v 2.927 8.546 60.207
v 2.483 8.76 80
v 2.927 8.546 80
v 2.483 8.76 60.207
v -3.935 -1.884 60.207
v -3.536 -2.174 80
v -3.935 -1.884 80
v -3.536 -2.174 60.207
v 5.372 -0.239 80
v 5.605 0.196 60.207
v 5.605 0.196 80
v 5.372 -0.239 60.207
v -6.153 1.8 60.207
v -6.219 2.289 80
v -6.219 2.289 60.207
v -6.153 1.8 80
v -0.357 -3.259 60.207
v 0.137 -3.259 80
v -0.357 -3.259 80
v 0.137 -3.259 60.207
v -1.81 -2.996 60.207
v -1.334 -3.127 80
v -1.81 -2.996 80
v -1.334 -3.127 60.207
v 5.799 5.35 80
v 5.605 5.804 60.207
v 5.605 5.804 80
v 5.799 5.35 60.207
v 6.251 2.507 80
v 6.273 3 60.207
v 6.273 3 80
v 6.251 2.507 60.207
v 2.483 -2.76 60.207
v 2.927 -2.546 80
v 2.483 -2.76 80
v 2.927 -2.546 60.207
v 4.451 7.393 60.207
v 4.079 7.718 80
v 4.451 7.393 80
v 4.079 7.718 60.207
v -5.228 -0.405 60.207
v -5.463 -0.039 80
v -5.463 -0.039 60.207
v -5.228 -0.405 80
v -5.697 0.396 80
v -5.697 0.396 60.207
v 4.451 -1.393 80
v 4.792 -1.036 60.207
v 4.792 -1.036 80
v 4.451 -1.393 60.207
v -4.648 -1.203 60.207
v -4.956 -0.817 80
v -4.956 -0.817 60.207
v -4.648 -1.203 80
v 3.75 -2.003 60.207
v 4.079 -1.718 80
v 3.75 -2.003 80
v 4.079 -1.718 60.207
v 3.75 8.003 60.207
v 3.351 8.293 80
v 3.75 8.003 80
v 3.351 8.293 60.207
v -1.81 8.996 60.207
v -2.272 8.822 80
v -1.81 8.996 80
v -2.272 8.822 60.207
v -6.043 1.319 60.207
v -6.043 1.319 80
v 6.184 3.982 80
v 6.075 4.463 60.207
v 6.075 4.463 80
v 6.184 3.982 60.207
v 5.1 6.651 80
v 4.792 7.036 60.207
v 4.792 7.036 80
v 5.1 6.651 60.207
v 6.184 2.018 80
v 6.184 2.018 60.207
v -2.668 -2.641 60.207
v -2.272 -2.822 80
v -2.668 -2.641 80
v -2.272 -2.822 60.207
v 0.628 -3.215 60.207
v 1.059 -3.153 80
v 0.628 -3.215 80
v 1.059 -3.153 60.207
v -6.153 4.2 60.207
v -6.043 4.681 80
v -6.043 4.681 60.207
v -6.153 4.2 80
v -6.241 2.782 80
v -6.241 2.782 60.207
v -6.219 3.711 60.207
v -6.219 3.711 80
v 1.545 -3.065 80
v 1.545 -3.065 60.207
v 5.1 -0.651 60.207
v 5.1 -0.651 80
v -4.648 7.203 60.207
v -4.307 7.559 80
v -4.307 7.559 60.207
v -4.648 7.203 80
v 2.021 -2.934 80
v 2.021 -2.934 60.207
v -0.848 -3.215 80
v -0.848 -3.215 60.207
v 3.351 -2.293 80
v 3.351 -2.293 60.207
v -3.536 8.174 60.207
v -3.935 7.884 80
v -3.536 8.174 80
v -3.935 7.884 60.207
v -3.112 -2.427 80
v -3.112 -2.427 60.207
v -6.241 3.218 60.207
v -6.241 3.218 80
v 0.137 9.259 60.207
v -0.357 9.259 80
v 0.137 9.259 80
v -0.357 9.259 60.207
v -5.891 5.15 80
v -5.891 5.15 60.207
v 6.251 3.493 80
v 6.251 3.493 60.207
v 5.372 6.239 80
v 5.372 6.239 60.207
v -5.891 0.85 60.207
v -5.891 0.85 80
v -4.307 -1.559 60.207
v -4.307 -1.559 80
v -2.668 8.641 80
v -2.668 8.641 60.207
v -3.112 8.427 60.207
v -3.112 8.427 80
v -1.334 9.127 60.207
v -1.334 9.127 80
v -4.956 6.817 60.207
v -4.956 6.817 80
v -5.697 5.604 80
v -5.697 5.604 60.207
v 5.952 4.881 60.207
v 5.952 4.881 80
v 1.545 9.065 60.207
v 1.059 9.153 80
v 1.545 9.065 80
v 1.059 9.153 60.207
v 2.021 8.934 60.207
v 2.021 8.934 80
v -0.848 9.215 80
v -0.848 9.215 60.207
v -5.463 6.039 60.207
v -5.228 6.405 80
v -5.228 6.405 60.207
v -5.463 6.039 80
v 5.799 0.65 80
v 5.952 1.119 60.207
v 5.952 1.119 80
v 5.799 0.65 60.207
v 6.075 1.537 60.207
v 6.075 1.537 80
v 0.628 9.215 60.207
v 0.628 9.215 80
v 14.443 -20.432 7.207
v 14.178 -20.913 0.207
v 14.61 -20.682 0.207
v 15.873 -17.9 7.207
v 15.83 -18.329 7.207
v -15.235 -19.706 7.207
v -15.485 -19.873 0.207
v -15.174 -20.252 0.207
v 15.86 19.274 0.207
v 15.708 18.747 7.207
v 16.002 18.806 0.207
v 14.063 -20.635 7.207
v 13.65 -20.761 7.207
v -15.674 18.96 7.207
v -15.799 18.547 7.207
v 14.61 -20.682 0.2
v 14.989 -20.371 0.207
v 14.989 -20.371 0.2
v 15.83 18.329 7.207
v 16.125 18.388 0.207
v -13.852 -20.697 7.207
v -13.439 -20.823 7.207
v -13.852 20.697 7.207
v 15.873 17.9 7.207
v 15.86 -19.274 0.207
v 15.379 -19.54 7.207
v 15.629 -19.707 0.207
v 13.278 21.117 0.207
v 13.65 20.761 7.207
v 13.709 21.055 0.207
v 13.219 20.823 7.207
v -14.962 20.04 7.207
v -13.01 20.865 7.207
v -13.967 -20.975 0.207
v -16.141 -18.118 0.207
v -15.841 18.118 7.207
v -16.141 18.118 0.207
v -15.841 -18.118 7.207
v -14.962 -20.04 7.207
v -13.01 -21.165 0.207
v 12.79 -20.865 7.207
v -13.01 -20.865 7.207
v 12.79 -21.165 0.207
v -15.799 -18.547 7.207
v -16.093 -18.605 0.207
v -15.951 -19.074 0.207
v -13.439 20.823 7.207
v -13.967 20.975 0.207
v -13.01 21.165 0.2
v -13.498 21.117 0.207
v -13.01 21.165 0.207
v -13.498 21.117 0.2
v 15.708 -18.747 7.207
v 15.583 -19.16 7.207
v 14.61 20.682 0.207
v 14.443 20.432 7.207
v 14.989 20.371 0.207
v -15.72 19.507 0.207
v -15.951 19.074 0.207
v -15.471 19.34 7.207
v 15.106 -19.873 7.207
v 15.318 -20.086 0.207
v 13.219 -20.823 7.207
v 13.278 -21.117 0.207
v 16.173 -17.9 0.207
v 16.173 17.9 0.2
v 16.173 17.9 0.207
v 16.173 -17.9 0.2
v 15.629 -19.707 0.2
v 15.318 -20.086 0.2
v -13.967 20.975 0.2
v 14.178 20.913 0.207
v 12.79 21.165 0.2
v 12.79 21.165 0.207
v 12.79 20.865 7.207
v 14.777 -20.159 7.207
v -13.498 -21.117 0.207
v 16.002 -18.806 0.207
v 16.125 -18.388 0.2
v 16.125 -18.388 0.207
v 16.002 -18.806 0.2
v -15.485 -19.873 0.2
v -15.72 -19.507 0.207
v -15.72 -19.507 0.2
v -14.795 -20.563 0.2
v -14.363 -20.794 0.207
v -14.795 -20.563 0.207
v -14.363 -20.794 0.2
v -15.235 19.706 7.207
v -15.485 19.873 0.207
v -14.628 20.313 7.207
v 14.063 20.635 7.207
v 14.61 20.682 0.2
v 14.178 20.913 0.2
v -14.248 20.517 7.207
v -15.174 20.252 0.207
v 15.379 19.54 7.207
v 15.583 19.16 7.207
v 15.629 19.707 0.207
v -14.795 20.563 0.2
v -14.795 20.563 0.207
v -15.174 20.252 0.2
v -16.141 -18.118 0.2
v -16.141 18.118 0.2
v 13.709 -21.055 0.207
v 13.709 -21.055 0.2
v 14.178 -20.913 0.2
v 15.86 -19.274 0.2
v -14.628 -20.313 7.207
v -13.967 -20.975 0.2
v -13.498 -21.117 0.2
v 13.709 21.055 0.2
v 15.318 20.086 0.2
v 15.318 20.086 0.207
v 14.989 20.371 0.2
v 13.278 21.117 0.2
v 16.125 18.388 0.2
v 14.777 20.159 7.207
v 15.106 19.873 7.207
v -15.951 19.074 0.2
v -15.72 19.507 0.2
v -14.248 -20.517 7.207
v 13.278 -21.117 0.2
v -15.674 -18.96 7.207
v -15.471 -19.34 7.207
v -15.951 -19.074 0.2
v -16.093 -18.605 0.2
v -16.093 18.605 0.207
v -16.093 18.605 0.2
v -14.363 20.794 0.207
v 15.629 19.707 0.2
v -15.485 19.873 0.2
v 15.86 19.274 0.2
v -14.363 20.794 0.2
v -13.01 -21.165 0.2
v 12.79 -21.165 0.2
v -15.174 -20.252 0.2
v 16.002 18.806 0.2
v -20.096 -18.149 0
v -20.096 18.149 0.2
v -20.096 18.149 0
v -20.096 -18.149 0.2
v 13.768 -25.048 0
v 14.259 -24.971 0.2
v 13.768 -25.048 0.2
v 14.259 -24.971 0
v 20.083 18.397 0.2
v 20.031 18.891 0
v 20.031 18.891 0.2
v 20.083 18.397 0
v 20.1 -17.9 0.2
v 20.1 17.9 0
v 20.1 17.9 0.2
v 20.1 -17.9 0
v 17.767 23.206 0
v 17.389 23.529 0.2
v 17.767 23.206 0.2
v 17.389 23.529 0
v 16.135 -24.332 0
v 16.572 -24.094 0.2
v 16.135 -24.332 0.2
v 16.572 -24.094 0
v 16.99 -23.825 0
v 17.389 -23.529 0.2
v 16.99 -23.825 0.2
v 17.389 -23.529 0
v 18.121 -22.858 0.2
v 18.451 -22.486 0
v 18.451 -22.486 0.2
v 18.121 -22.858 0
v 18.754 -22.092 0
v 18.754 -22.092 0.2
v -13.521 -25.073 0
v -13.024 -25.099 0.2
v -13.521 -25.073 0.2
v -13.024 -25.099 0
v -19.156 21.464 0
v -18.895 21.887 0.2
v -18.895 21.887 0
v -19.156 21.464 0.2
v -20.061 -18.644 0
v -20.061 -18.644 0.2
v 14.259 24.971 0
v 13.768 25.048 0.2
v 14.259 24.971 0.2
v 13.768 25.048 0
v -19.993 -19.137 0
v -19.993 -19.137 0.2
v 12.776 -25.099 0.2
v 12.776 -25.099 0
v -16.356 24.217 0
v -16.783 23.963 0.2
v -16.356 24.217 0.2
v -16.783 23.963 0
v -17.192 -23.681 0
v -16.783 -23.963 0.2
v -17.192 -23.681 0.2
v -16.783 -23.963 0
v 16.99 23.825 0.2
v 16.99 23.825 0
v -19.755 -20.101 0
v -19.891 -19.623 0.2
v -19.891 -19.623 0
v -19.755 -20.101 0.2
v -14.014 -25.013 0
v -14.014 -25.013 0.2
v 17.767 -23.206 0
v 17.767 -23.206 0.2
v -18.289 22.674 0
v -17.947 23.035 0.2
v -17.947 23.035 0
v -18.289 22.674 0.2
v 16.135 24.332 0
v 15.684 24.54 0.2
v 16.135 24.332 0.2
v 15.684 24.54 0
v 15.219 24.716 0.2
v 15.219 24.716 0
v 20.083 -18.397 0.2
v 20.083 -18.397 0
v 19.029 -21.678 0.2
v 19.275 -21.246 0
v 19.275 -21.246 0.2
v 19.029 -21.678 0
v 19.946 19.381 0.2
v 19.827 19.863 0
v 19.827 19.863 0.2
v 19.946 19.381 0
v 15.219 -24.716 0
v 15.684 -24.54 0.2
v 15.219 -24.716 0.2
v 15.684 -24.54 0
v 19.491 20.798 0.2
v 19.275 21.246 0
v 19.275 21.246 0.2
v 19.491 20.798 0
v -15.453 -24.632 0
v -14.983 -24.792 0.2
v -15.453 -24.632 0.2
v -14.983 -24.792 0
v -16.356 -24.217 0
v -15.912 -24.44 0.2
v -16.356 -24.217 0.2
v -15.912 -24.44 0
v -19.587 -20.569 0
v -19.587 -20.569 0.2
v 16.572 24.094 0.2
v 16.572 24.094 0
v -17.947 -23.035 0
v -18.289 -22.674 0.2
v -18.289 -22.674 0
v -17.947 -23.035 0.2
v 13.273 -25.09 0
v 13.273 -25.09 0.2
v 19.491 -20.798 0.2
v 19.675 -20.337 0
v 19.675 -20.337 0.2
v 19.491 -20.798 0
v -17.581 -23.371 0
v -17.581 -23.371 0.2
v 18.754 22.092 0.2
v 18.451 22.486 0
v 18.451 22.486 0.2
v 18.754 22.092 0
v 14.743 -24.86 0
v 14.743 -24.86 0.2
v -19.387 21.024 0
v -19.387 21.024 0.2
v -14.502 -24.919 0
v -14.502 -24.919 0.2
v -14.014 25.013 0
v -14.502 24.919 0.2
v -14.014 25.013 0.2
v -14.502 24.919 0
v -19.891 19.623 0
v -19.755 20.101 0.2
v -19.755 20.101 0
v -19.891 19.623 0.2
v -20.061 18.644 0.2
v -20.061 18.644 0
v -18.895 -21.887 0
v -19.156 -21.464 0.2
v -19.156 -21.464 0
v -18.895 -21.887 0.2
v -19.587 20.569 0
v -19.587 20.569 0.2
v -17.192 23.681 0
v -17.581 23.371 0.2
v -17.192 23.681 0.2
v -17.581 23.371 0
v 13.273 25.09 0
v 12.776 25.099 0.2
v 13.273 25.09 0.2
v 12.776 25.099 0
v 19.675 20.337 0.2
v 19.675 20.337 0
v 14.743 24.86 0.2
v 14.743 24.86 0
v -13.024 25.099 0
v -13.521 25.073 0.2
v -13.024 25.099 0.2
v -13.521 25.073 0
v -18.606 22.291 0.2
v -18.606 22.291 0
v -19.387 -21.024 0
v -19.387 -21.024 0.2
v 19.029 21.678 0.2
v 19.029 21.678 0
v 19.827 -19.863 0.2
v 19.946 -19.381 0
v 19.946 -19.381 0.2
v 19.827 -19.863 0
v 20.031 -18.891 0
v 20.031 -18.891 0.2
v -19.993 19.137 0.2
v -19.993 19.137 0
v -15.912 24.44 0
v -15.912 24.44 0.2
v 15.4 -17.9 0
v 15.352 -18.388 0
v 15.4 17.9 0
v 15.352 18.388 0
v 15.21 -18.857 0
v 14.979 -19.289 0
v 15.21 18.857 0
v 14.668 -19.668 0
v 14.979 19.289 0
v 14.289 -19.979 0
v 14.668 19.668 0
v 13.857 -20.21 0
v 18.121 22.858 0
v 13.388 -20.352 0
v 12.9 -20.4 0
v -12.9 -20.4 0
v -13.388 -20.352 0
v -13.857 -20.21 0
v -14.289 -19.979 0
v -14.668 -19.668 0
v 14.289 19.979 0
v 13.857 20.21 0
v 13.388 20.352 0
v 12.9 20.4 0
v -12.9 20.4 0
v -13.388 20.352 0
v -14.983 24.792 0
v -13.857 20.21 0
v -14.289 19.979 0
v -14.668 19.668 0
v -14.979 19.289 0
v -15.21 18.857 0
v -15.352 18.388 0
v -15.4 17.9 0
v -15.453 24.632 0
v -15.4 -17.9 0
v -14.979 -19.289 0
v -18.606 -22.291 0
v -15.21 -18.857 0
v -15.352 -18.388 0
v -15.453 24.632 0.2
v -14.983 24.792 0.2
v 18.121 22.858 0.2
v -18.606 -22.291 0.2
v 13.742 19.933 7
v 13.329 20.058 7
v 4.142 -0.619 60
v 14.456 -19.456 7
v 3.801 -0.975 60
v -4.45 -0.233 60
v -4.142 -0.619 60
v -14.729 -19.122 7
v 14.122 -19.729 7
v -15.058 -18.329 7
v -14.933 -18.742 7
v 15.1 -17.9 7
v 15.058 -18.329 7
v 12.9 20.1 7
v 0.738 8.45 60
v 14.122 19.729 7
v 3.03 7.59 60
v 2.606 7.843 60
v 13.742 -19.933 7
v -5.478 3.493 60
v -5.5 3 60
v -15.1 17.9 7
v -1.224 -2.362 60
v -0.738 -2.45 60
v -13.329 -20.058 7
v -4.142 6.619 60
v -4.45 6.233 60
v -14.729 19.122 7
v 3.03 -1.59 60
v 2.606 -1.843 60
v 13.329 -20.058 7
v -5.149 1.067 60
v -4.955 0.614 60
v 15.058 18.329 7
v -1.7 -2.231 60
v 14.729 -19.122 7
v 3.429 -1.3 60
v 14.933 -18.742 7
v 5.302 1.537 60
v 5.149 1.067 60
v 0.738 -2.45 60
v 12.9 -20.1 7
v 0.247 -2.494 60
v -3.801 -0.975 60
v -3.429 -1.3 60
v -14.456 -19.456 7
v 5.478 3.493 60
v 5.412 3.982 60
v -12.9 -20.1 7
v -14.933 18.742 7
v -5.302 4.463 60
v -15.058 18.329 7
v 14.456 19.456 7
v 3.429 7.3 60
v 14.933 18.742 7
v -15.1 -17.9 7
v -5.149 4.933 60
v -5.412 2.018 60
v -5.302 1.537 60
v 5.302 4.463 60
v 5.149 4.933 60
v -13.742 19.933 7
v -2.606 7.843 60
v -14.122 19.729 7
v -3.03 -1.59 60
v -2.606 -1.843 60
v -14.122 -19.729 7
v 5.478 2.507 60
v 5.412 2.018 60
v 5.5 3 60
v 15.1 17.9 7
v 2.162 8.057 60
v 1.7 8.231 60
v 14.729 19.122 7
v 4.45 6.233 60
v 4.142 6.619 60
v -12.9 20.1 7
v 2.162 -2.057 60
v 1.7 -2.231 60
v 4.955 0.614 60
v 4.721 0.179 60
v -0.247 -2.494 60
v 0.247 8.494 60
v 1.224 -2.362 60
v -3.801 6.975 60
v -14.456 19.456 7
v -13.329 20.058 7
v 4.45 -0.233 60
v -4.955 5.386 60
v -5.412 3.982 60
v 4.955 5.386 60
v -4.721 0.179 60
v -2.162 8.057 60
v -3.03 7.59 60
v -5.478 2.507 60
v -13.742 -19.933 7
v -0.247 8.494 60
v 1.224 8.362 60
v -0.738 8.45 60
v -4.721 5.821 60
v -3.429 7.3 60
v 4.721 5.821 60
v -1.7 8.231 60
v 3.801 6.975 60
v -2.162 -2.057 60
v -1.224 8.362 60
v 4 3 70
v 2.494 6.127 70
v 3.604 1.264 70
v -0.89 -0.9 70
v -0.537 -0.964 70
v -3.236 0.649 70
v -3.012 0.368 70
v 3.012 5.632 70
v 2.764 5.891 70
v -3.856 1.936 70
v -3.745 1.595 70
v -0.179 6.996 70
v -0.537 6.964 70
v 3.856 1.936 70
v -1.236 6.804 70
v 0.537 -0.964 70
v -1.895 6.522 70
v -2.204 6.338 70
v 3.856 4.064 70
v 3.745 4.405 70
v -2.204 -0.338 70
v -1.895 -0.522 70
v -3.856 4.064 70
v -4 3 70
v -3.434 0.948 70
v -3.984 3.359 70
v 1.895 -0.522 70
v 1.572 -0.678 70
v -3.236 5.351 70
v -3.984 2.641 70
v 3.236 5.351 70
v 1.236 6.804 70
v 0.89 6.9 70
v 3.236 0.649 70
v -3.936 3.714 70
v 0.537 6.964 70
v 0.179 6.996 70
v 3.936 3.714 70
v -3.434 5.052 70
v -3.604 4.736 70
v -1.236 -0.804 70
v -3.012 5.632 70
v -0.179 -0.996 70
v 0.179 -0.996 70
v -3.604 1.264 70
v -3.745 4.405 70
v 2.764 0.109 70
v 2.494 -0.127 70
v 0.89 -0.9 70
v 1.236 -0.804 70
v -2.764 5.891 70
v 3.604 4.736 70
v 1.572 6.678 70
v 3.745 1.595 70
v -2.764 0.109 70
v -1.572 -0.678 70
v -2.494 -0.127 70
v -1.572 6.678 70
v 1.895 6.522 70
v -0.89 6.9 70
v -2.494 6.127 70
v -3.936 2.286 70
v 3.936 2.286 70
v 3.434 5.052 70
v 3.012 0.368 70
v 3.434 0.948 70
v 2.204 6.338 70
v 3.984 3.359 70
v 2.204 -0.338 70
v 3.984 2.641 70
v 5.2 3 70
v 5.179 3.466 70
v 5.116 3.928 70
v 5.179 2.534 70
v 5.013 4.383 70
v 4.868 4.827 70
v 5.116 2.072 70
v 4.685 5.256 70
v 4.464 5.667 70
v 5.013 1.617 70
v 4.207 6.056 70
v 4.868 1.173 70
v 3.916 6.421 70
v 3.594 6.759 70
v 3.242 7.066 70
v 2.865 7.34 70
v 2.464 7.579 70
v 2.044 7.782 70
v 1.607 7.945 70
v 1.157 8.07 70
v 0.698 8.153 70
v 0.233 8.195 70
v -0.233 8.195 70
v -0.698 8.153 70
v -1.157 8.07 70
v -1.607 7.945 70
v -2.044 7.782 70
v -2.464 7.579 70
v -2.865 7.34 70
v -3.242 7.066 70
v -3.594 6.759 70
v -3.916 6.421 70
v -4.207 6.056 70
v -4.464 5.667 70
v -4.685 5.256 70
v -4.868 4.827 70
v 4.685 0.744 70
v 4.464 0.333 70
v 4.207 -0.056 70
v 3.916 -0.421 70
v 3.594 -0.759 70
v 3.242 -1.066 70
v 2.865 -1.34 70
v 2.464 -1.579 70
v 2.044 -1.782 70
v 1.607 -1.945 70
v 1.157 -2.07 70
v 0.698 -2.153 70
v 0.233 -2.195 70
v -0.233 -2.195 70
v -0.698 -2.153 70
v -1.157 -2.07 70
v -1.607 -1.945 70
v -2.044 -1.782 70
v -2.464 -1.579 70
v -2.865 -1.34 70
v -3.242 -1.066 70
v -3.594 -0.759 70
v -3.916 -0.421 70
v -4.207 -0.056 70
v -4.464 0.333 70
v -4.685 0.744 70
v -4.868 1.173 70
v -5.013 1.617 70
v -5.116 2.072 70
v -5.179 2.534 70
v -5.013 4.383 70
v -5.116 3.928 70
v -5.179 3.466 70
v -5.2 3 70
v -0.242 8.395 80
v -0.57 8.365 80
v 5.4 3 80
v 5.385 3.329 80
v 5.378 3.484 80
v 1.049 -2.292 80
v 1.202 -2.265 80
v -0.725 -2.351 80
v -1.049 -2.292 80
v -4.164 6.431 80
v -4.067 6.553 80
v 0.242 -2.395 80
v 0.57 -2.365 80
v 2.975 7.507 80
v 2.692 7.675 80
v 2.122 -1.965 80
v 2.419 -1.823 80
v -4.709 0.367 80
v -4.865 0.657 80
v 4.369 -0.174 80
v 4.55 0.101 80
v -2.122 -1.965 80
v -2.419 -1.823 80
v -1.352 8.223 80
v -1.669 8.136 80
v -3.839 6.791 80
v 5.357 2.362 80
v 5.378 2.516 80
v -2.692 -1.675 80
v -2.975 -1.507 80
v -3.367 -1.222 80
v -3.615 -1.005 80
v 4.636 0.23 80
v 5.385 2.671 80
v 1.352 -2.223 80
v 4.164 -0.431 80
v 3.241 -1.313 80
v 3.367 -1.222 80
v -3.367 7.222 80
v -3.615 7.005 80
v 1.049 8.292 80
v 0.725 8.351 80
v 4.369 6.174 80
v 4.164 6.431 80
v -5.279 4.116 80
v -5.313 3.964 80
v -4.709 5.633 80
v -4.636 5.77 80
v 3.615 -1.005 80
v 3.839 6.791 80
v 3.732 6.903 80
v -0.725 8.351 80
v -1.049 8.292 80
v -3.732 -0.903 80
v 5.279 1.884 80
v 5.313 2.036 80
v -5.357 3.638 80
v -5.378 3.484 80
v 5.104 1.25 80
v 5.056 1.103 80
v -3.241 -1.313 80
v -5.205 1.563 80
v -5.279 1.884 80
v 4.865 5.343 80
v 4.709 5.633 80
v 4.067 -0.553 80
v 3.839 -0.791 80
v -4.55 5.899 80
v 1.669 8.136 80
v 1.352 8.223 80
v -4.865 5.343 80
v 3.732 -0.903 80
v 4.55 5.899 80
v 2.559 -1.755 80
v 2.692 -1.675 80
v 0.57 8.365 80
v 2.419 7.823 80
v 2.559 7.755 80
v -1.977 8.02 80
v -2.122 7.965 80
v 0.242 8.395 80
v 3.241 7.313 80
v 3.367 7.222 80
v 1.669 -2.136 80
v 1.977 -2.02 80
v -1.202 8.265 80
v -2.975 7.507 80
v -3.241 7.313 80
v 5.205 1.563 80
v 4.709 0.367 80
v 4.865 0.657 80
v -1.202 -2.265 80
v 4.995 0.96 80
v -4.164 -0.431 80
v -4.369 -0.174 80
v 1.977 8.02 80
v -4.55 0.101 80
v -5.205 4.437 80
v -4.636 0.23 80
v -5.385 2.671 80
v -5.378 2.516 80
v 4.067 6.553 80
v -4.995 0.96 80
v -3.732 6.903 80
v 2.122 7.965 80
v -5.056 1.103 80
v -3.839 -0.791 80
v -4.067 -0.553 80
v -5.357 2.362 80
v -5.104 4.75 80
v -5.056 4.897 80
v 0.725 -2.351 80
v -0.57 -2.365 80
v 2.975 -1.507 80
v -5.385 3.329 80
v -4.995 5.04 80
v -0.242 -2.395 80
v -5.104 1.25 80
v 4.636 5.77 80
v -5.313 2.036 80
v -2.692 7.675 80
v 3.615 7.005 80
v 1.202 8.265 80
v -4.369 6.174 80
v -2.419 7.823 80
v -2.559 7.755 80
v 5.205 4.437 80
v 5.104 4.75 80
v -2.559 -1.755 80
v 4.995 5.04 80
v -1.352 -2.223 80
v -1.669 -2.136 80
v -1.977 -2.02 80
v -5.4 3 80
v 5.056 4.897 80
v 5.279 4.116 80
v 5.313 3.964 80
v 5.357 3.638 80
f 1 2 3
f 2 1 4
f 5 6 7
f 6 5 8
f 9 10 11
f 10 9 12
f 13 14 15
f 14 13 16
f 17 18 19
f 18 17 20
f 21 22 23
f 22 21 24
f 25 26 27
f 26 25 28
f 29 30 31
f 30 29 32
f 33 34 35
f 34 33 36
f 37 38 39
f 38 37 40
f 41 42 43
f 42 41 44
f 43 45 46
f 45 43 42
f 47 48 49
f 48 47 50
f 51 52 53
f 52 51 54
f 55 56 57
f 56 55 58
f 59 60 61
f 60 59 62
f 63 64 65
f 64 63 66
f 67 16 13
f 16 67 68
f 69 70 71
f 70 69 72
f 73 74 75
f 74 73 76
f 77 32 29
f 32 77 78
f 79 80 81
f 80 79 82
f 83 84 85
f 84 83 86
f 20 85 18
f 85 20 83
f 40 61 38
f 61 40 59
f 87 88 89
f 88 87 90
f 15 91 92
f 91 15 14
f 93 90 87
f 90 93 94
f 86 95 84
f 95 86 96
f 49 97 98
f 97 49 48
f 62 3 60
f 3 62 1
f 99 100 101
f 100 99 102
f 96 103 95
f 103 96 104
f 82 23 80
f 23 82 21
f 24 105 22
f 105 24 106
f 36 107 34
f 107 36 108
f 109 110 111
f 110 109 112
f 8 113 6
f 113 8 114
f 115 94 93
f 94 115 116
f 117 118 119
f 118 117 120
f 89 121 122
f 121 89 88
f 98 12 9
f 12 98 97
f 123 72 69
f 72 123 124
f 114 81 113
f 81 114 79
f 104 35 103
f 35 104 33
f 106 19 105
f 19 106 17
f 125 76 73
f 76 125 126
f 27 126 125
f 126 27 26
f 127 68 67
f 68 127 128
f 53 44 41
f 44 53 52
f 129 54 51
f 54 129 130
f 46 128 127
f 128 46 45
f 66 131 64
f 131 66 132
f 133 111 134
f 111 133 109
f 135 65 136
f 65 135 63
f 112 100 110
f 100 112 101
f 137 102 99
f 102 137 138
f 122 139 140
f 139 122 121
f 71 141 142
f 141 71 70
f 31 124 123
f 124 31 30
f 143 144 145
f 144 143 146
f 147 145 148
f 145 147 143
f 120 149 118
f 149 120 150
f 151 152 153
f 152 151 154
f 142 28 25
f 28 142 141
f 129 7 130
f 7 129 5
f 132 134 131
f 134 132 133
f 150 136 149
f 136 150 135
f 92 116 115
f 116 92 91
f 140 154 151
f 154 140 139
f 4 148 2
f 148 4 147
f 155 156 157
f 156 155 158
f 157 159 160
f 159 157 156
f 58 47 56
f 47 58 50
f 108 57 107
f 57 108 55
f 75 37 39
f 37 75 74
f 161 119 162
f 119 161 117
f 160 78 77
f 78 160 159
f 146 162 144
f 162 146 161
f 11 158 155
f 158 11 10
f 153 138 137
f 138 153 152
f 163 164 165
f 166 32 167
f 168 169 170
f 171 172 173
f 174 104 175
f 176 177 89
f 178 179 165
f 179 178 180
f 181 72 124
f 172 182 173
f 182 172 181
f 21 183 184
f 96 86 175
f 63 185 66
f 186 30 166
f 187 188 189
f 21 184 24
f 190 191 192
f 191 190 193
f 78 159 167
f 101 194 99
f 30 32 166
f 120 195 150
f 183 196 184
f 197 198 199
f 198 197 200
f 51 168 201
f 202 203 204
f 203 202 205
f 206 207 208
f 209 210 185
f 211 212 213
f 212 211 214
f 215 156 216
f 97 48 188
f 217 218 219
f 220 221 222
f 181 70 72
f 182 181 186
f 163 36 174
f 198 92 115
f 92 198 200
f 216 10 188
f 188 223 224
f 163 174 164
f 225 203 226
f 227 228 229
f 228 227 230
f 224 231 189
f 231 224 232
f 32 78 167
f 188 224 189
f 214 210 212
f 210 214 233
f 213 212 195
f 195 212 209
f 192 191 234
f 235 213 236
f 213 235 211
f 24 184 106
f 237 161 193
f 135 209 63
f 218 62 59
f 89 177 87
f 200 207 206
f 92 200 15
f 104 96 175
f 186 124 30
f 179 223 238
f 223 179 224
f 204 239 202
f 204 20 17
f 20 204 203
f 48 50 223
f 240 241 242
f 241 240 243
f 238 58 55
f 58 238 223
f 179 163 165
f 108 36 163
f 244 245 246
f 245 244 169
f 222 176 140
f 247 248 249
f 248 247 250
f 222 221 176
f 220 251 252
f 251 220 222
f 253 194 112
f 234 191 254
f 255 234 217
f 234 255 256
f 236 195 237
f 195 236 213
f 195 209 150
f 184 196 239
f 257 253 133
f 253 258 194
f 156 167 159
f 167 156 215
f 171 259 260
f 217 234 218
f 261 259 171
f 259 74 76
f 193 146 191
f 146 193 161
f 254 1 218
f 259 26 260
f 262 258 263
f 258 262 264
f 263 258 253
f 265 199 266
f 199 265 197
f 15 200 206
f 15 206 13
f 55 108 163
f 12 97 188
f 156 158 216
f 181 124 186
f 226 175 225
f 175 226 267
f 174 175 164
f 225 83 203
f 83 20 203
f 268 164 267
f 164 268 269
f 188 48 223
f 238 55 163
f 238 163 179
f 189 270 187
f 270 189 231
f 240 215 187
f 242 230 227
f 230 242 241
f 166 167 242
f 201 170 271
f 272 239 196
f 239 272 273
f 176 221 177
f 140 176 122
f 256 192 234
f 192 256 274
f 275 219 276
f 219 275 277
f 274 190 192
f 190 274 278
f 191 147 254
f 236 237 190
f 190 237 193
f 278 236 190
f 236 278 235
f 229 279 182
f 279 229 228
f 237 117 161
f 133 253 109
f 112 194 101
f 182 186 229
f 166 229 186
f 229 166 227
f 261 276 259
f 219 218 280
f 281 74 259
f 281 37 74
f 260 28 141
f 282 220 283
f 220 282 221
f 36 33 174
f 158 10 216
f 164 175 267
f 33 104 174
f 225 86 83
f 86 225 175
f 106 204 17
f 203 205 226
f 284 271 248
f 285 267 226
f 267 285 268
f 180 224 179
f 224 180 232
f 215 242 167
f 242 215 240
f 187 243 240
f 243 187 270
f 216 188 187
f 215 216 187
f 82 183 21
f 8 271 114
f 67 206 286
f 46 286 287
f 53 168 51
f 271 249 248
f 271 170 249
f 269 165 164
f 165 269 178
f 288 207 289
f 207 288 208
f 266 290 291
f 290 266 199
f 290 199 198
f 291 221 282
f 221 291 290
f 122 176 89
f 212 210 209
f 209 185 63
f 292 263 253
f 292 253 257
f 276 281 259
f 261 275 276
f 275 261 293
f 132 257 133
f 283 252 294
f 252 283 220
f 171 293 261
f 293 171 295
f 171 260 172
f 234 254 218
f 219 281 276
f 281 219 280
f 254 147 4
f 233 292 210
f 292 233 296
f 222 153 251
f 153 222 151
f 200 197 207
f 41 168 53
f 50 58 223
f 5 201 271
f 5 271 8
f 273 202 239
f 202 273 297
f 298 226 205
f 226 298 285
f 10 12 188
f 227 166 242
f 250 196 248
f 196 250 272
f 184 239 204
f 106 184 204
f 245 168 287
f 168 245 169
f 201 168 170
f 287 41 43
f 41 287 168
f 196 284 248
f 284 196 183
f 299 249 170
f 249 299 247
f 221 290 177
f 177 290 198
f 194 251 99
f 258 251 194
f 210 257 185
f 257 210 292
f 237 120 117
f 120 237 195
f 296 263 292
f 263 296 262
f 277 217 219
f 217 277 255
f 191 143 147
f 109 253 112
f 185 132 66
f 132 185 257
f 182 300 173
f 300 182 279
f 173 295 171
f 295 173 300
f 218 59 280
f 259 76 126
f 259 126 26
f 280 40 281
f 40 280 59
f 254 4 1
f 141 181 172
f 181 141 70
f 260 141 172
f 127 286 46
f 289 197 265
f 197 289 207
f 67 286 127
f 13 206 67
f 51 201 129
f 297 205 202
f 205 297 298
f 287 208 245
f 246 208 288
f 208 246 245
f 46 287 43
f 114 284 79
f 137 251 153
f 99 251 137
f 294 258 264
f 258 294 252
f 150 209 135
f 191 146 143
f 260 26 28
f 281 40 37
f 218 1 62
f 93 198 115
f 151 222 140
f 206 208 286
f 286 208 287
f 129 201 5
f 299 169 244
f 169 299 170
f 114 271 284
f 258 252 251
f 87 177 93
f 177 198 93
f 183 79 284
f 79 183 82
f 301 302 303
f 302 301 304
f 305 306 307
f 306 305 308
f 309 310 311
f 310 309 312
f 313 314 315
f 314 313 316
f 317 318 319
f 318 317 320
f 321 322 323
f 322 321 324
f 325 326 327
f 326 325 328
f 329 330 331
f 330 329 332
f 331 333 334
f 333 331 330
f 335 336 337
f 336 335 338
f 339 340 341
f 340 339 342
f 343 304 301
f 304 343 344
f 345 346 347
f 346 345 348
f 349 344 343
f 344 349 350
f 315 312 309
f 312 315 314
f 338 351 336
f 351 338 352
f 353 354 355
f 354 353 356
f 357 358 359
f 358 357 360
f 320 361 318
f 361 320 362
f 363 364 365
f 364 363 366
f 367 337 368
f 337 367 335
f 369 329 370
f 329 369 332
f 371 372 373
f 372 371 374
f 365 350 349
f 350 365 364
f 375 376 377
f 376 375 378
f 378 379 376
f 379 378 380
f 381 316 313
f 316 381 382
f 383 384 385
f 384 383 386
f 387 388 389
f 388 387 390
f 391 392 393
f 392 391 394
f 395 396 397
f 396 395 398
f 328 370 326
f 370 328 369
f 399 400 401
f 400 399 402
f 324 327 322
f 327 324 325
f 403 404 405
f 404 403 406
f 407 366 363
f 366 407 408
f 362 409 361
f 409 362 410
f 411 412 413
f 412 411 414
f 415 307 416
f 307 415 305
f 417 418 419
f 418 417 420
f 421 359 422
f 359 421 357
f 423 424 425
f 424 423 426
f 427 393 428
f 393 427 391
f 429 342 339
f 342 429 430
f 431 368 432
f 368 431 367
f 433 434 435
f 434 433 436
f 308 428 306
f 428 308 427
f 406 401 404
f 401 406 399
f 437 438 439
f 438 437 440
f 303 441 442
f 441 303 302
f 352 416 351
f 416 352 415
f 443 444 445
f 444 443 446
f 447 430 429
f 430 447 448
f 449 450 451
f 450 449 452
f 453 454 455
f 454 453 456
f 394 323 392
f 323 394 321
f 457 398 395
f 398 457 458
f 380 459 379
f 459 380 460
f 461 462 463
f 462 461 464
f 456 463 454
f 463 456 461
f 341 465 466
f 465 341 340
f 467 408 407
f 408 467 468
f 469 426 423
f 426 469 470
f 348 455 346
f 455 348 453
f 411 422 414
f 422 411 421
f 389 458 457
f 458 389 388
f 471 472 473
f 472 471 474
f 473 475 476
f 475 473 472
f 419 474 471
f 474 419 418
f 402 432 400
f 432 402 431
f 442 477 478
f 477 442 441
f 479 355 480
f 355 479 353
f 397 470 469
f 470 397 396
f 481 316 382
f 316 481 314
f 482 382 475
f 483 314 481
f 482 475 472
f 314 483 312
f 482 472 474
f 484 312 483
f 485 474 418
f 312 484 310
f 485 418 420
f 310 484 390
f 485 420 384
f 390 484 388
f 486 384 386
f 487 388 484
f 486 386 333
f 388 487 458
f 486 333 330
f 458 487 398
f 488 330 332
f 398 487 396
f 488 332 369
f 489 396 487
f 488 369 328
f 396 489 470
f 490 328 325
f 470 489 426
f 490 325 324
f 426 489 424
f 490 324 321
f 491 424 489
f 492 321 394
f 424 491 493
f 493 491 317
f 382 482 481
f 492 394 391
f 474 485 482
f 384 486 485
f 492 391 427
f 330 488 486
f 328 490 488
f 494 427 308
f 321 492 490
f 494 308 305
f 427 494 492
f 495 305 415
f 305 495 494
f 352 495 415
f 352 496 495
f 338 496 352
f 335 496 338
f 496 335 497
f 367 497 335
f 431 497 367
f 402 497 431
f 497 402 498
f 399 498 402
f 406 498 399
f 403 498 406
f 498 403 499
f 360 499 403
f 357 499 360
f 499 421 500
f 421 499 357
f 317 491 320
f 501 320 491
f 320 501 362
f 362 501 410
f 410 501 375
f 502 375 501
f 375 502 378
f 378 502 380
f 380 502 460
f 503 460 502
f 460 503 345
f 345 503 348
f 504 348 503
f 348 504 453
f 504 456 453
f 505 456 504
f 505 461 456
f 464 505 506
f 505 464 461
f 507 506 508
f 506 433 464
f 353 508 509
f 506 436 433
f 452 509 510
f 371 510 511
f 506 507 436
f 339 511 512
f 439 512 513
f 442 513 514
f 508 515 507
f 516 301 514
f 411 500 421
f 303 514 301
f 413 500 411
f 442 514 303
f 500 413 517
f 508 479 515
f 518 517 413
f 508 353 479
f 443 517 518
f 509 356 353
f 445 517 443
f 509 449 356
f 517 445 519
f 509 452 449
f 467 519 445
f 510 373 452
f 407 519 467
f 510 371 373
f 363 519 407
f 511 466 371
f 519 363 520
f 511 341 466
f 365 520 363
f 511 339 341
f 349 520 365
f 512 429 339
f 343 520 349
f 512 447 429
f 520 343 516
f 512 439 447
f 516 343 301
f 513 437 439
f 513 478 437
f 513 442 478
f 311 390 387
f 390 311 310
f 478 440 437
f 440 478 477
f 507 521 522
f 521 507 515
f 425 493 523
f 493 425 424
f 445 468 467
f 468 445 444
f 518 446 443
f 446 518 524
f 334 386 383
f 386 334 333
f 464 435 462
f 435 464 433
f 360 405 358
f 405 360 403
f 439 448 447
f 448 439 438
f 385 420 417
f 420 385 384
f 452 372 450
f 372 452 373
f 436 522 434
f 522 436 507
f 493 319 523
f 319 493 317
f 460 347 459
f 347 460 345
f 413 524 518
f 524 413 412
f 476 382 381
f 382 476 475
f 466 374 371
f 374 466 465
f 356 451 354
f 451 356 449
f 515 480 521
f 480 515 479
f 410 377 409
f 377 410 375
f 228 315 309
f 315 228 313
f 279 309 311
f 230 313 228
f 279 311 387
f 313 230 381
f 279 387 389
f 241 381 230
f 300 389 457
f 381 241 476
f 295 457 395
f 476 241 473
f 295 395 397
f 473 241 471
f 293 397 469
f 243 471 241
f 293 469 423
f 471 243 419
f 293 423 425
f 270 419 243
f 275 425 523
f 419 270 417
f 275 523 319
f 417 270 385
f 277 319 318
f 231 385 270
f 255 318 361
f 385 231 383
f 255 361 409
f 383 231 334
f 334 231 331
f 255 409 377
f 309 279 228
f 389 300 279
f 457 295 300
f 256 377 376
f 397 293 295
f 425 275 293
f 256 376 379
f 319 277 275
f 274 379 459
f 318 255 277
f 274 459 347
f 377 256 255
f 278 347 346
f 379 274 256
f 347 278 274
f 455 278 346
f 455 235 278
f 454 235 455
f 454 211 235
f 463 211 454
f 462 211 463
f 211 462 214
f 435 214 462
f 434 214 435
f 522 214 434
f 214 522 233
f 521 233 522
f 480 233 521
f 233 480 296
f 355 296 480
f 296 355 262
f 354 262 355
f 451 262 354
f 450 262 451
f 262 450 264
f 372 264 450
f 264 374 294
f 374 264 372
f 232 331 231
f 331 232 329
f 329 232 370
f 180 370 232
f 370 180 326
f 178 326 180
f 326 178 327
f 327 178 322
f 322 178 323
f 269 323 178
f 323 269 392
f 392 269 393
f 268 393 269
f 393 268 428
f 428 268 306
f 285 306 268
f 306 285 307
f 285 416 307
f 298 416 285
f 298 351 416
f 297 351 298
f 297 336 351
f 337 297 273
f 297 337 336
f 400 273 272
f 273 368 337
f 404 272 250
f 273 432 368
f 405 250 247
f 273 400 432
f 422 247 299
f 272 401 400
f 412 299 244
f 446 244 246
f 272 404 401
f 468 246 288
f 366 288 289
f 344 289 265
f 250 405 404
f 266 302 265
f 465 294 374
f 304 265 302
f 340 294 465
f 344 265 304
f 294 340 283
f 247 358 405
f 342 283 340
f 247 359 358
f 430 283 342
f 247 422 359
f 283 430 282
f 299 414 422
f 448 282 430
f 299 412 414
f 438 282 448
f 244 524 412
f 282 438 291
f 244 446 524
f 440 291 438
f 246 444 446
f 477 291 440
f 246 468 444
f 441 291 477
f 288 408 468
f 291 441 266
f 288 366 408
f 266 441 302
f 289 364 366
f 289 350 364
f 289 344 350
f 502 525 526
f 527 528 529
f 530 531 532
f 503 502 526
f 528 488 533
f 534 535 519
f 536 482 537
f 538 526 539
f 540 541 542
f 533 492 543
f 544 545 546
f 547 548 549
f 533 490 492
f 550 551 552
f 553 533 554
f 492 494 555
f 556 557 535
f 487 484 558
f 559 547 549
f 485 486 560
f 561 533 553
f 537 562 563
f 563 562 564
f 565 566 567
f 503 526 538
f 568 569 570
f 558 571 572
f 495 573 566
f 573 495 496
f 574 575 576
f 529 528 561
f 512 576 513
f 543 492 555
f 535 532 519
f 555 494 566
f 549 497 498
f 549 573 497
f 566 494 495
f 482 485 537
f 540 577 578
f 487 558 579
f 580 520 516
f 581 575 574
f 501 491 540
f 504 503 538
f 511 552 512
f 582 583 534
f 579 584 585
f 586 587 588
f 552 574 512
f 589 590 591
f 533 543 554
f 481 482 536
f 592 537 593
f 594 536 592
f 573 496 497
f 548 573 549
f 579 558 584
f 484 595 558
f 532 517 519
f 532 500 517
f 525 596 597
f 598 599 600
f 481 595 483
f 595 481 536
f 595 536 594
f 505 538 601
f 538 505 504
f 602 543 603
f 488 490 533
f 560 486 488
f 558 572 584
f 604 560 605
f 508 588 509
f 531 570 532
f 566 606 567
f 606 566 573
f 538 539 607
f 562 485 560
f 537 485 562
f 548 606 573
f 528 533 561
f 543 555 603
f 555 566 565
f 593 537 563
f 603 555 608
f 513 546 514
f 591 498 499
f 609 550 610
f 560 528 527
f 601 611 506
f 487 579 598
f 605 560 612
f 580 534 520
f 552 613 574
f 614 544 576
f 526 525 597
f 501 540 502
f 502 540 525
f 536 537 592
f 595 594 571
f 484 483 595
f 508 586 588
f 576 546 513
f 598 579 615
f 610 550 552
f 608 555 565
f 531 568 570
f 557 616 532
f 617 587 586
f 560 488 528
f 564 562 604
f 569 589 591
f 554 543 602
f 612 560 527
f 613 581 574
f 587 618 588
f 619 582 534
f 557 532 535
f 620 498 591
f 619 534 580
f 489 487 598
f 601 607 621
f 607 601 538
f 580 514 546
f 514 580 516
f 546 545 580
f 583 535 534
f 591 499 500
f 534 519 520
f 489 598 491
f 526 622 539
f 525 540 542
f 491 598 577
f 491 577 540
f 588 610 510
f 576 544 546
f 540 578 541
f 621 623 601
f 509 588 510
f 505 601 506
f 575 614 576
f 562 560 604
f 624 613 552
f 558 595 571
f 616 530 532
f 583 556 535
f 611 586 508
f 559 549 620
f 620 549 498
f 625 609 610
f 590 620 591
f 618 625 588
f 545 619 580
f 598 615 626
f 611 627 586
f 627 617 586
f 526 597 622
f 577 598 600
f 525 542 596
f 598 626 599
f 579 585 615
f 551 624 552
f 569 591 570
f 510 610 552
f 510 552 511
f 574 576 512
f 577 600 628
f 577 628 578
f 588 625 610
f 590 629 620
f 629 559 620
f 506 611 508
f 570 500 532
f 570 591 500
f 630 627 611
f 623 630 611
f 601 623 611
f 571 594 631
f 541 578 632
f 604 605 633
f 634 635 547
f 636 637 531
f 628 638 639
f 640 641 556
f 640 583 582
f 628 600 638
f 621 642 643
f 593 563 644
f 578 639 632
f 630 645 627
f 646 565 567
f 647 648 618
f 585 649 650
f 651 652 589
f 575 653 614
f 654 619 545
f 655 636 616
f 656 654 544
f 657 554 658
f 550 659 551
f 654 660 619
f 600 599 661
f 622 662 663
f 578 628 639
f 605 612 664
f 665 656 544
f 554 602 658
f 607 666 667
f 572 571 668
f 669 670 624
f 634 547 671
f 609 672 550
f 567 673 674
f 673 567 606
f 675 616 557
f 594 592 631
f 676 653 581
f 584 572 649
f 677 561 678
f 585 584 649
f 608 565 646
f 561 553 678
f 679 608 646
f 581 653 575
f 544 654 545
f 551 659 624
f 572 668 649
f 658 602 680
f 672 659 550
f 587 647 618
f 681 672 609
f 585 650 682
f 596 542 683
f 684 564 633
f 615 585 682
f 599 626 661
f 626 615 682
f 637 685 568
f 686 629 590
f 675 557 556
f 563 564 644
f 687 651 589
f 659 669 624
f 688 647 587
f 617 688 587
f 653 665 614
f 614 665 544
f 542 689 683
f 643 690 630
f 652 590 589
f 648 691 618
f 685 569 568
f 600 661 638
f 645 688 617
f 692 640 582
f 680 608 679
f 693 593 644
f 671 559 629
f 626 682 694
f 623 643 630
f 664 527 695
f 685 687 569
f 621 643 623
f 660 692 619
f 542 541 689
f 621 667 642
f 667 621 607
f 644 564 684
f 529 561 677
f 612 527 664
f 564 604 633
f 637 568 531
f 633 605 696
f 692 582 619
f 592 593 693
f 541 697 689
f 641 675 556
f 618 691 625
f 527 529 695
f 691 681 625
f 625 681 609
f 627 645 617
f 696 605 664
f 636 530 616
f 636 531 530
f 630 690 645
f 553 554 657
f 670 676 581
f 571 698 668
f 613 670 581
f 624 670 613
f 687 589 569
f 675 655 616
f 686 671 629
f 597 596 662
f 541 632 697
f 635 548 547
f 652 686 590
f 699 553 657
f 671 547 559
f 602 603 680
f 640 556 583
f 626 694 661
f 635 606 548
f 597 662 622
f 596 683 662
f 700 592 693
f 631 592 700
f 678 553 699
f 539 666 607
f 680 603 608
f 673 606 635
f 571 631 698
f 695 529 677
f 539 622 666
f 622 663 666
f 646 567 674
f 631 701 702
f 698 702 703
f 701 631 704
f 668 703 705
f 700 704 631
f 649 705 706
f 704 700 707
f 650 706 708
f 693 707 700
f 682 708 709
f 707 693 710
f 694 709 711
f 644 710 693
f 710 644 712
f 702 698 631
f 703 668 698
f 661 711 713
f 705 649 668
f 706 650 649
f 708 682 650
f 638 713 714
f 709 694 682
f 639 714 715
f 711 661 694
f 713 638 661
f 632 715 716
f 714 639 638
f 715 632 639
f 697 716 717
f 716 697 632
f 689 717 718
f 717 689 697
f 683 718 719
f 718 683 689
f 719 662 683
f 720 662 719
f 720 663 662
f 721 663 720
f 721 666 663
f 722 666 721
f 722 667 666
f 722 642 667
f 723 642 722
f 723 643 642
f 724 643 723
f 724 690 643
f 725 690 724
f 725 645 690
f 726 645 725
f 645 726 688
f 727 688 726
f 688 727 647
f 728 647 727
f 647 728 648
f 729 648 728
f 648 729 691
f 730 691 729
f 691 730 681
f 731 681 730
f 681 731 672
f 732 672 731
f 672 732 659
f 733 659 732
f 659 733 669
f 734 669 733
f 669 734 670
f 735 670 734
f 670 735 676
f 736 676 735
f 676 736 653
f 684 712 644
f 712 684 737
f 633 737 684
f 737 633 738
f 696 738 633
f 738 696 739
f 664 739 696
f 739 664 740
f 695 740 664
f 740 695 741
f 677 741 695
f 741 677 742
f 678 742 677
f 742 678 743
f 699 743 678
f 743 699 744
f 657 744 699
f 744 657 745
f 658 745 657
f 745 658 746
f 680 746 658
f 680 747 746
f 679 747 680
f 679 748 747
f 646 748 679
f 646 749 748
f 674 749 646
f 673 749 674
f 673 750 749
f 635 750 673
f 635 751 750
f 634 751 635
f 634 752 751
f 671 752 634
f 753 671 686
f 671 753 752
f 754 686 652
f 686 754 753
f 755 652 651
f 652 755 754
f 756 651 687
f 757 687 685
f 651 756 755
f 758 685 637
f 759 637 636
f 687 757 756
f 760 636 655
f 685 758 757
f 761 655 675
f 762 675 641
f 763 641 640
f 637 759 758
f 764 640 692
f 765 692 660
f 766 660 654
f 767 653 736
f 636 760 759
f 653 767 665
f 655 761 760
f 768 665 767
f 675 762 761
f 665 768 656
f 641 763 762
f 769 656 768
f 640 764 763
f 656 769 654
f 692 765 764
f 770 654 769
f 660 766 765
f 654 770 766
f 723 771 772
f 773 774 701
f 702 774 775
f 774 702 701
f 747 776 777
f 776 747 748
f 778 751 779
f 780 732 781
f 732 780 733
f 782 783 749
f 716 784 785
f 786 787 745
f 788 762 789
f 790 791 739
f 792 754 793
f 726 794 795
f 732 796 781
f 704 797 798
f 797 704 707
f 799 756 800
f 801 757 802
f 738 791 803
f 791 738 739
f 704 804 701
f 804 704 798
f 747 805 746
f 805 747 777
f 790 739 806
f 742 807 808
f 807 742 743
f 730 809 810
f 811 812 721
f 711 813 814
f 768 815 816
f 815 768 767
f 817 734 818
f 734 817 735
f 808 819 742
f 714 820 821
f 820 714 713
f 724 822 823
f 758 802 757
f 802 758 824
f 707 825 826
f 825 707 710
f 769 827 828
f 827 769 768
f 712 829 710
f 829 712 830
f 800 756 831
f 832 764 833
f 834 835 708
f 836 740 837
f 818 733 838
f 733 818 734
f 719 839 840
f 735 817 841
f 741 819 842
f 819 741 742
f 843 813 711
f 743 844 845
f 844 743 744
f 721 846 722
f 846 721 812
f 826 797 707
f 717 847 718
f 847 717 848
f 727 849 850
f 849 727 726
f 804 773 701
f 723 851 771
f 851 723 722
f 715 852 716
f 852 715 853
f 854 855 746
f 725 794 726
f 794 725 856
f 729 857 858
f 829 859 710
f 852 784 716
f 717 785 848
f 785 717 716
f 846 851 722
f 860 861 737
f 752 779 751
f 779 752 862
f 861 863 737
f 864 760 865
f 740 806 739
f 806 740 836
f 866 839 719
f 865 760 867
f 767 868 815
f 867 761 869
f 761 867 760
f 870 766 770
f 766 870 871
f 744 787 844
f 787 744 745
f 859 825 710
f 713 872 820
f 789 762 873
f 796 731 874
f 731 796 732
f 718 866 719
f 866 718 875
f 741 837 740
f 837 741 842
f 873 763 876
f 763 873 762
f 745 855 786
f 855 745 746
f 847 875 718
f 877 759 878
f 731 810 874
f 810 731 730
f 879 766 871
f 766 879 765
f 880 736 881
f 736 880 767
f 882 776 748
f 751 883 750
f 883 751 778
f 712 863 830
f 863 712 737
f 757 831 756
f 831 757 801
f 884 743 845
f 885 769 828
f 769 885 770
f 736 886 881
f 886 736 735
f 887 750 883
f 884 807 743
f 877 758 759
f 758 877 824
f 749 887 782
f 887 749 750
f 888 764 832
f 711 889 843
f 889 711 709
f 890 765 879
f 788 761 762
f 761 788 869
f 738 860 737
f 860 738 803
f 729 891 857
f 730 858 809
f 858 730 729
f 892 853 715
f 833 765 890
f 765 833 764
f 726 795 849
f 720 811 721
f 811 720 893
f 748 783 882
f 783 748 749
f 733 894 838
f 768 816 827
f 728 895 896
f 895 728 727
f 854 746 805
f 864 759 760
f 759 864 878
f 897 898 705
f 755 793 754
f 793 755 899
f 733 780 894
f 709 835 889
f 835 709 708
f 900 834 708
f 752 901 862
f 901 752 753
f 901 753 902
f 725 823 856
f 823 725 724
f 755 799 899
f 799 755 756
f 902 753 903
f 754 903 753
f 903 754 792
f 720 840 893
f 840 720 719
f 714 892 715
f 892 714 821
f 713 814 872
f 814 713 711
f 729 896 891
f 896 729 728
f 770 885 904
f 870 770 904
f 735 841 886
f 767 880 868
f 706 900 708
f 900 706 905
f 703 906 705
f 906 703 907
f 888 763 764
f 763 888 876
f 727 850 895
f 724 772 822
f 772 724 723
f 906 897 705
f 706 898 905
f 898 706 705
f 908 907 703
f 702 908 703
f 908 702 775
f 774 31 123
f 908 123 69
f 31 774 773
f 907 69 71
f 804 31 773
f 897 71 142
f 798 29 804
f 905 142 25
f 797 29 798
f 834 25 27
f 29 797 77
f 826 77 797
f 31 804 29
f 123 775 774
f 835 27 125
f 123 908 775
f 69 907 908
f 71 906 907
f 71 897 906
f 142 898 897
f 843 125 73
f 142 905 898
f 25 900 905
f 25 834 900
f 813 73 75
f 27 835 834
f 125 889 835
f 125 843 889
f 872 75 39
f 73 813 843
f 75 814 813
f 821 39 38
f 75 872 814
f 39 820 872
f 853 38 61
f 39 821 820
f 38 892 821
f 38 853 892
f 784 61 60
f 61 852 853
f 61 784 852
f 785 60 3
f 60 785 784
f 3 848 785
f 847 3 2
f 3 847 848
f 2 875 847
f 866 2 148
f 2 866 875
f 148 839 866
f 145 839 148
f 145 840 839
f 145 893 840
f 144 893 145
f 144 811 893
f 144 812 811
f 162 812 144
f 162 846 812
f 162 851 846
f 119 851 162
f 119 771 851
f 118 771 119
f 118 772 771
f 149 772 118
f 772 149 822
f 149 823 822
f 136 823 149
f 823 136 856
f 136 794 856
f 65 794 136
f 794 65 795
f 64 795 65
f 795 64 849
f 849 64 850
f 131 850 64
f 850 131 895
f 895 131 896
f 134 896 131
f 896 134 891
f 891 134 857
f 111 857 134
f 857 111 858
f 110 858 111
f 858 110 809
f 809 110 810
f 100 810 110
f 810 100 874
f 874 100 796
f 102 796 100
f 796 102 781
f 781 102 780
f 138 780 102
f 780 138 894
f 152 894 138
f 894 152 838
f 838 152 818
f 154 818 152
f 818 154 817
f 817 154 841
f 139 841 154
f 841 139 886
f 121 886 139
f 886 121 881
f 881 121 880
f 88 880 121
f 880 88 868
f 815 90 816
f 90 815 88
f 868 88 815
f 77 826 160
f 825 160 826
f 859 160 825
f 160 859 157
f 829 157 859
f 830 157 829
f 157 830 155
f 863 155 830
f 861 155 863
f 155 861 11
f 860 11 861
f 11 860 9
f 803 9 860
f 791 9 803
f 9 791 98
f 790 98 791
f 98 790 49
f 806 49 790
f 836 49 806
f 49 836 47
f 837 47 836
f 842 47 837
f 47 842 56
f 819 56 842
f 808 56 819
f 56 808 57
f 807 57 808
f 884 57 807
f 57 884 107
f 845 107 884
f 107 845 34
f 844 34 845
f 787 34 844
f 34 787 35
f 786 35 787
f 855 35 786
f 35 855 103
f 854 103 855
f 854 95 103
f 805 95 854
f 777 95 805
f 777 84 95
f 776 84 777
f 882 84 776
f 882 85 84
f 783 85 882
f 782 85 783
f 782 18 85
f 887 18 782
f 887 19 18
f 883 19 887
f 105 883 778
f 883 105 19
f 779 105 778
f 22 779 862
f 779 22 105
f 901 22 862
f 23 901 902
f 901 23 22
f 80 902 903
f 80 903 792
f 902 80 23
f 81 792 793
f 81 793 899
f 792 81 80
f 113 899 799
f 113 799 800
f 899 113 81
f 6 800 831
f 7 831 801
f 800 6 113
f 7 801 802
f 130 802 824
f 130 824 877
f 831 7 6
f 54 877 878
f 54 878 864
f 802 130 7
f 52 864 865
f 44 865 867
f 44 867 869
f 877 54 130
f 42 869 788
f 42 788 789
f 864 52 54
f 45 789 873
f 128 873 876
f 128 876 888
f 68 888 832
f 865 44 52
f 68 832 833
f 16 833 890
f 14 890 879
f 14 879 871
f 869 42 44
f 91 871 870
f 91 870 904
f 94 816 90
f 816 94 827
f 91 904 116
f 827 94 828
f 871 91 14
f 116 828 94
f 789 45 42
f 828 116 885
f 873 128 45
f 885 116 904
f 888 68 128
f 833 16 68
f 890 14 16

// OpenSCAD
$fa=1;
$fs=.5;

cl=0.2;
l=40+cl;
w=30+cl;
d=3;
th=.8;
r1=2+cl;
r2=2+cl;


od=11;
t=8;
id=0;

h=80;

brim=true;
//brim=false;
xsec=false;
//xsec=true;

module orifice(r1a,r1b,r2a,r2b,h) {
	hull() {
		for(x=[-w/2+r1,w/2-r1]) translate([x,l/2-r1,0]) cylinder(h,r1a,r1b,false);
		for(x=[-w/2+r2,w/2-r2]) translate([x,-l/2+r2,0]) cylinder(h,r2a,r2b,false);
	}
}

module funnel() {
	hull() {
		orifice(r1+.3,r1,r2+.3,r2,7);
		translate([0,d,h-21]) cylinder(1,od/2,od/2,false);
	}
}

difference() {
	union() {
		minkowski() {
			union() {
				funnel();
				translate([0,d,0]) cylinder(h,od/2,od/2,false);
			}
			sphere(th);
		}

		//Brim
		if(brim==true) orifice(r1+5,r1+5,r2+5,r2+5,.2);
	}
	funnel();
	translate([0,d,h-20]) cylinder(10,od/2,t/2,false);
	translate([0,d,h-10]) cylinder(15,od/2-.3,od/2,false);
	translate([0,0,-2]) orifice(r1+2,r1-2,r2+2,r2-2,4);
	translate([0,0,-2]) cube([2*w,2*l,4],true);
	//cylinder(100,(t-2)/2,(t-2)/2,false);
	translate([0,0,h])cylinder(10,20,20,false);

	if (xsec==true) rotate([0,0,90]) translate([0,0,-50]) cube([l,w*2,h*2],false);
}
//cube([w-r1-r2,l-r1-r2,2],true);
//color("Black") translate([w/2-0.75,0,2.25]) rotate([90,0,0]) cylinder(10,2.5/2,2.5/2,true);

//translate([0,-150,0]) rotate([-15,0,0]) cube(100,false);
